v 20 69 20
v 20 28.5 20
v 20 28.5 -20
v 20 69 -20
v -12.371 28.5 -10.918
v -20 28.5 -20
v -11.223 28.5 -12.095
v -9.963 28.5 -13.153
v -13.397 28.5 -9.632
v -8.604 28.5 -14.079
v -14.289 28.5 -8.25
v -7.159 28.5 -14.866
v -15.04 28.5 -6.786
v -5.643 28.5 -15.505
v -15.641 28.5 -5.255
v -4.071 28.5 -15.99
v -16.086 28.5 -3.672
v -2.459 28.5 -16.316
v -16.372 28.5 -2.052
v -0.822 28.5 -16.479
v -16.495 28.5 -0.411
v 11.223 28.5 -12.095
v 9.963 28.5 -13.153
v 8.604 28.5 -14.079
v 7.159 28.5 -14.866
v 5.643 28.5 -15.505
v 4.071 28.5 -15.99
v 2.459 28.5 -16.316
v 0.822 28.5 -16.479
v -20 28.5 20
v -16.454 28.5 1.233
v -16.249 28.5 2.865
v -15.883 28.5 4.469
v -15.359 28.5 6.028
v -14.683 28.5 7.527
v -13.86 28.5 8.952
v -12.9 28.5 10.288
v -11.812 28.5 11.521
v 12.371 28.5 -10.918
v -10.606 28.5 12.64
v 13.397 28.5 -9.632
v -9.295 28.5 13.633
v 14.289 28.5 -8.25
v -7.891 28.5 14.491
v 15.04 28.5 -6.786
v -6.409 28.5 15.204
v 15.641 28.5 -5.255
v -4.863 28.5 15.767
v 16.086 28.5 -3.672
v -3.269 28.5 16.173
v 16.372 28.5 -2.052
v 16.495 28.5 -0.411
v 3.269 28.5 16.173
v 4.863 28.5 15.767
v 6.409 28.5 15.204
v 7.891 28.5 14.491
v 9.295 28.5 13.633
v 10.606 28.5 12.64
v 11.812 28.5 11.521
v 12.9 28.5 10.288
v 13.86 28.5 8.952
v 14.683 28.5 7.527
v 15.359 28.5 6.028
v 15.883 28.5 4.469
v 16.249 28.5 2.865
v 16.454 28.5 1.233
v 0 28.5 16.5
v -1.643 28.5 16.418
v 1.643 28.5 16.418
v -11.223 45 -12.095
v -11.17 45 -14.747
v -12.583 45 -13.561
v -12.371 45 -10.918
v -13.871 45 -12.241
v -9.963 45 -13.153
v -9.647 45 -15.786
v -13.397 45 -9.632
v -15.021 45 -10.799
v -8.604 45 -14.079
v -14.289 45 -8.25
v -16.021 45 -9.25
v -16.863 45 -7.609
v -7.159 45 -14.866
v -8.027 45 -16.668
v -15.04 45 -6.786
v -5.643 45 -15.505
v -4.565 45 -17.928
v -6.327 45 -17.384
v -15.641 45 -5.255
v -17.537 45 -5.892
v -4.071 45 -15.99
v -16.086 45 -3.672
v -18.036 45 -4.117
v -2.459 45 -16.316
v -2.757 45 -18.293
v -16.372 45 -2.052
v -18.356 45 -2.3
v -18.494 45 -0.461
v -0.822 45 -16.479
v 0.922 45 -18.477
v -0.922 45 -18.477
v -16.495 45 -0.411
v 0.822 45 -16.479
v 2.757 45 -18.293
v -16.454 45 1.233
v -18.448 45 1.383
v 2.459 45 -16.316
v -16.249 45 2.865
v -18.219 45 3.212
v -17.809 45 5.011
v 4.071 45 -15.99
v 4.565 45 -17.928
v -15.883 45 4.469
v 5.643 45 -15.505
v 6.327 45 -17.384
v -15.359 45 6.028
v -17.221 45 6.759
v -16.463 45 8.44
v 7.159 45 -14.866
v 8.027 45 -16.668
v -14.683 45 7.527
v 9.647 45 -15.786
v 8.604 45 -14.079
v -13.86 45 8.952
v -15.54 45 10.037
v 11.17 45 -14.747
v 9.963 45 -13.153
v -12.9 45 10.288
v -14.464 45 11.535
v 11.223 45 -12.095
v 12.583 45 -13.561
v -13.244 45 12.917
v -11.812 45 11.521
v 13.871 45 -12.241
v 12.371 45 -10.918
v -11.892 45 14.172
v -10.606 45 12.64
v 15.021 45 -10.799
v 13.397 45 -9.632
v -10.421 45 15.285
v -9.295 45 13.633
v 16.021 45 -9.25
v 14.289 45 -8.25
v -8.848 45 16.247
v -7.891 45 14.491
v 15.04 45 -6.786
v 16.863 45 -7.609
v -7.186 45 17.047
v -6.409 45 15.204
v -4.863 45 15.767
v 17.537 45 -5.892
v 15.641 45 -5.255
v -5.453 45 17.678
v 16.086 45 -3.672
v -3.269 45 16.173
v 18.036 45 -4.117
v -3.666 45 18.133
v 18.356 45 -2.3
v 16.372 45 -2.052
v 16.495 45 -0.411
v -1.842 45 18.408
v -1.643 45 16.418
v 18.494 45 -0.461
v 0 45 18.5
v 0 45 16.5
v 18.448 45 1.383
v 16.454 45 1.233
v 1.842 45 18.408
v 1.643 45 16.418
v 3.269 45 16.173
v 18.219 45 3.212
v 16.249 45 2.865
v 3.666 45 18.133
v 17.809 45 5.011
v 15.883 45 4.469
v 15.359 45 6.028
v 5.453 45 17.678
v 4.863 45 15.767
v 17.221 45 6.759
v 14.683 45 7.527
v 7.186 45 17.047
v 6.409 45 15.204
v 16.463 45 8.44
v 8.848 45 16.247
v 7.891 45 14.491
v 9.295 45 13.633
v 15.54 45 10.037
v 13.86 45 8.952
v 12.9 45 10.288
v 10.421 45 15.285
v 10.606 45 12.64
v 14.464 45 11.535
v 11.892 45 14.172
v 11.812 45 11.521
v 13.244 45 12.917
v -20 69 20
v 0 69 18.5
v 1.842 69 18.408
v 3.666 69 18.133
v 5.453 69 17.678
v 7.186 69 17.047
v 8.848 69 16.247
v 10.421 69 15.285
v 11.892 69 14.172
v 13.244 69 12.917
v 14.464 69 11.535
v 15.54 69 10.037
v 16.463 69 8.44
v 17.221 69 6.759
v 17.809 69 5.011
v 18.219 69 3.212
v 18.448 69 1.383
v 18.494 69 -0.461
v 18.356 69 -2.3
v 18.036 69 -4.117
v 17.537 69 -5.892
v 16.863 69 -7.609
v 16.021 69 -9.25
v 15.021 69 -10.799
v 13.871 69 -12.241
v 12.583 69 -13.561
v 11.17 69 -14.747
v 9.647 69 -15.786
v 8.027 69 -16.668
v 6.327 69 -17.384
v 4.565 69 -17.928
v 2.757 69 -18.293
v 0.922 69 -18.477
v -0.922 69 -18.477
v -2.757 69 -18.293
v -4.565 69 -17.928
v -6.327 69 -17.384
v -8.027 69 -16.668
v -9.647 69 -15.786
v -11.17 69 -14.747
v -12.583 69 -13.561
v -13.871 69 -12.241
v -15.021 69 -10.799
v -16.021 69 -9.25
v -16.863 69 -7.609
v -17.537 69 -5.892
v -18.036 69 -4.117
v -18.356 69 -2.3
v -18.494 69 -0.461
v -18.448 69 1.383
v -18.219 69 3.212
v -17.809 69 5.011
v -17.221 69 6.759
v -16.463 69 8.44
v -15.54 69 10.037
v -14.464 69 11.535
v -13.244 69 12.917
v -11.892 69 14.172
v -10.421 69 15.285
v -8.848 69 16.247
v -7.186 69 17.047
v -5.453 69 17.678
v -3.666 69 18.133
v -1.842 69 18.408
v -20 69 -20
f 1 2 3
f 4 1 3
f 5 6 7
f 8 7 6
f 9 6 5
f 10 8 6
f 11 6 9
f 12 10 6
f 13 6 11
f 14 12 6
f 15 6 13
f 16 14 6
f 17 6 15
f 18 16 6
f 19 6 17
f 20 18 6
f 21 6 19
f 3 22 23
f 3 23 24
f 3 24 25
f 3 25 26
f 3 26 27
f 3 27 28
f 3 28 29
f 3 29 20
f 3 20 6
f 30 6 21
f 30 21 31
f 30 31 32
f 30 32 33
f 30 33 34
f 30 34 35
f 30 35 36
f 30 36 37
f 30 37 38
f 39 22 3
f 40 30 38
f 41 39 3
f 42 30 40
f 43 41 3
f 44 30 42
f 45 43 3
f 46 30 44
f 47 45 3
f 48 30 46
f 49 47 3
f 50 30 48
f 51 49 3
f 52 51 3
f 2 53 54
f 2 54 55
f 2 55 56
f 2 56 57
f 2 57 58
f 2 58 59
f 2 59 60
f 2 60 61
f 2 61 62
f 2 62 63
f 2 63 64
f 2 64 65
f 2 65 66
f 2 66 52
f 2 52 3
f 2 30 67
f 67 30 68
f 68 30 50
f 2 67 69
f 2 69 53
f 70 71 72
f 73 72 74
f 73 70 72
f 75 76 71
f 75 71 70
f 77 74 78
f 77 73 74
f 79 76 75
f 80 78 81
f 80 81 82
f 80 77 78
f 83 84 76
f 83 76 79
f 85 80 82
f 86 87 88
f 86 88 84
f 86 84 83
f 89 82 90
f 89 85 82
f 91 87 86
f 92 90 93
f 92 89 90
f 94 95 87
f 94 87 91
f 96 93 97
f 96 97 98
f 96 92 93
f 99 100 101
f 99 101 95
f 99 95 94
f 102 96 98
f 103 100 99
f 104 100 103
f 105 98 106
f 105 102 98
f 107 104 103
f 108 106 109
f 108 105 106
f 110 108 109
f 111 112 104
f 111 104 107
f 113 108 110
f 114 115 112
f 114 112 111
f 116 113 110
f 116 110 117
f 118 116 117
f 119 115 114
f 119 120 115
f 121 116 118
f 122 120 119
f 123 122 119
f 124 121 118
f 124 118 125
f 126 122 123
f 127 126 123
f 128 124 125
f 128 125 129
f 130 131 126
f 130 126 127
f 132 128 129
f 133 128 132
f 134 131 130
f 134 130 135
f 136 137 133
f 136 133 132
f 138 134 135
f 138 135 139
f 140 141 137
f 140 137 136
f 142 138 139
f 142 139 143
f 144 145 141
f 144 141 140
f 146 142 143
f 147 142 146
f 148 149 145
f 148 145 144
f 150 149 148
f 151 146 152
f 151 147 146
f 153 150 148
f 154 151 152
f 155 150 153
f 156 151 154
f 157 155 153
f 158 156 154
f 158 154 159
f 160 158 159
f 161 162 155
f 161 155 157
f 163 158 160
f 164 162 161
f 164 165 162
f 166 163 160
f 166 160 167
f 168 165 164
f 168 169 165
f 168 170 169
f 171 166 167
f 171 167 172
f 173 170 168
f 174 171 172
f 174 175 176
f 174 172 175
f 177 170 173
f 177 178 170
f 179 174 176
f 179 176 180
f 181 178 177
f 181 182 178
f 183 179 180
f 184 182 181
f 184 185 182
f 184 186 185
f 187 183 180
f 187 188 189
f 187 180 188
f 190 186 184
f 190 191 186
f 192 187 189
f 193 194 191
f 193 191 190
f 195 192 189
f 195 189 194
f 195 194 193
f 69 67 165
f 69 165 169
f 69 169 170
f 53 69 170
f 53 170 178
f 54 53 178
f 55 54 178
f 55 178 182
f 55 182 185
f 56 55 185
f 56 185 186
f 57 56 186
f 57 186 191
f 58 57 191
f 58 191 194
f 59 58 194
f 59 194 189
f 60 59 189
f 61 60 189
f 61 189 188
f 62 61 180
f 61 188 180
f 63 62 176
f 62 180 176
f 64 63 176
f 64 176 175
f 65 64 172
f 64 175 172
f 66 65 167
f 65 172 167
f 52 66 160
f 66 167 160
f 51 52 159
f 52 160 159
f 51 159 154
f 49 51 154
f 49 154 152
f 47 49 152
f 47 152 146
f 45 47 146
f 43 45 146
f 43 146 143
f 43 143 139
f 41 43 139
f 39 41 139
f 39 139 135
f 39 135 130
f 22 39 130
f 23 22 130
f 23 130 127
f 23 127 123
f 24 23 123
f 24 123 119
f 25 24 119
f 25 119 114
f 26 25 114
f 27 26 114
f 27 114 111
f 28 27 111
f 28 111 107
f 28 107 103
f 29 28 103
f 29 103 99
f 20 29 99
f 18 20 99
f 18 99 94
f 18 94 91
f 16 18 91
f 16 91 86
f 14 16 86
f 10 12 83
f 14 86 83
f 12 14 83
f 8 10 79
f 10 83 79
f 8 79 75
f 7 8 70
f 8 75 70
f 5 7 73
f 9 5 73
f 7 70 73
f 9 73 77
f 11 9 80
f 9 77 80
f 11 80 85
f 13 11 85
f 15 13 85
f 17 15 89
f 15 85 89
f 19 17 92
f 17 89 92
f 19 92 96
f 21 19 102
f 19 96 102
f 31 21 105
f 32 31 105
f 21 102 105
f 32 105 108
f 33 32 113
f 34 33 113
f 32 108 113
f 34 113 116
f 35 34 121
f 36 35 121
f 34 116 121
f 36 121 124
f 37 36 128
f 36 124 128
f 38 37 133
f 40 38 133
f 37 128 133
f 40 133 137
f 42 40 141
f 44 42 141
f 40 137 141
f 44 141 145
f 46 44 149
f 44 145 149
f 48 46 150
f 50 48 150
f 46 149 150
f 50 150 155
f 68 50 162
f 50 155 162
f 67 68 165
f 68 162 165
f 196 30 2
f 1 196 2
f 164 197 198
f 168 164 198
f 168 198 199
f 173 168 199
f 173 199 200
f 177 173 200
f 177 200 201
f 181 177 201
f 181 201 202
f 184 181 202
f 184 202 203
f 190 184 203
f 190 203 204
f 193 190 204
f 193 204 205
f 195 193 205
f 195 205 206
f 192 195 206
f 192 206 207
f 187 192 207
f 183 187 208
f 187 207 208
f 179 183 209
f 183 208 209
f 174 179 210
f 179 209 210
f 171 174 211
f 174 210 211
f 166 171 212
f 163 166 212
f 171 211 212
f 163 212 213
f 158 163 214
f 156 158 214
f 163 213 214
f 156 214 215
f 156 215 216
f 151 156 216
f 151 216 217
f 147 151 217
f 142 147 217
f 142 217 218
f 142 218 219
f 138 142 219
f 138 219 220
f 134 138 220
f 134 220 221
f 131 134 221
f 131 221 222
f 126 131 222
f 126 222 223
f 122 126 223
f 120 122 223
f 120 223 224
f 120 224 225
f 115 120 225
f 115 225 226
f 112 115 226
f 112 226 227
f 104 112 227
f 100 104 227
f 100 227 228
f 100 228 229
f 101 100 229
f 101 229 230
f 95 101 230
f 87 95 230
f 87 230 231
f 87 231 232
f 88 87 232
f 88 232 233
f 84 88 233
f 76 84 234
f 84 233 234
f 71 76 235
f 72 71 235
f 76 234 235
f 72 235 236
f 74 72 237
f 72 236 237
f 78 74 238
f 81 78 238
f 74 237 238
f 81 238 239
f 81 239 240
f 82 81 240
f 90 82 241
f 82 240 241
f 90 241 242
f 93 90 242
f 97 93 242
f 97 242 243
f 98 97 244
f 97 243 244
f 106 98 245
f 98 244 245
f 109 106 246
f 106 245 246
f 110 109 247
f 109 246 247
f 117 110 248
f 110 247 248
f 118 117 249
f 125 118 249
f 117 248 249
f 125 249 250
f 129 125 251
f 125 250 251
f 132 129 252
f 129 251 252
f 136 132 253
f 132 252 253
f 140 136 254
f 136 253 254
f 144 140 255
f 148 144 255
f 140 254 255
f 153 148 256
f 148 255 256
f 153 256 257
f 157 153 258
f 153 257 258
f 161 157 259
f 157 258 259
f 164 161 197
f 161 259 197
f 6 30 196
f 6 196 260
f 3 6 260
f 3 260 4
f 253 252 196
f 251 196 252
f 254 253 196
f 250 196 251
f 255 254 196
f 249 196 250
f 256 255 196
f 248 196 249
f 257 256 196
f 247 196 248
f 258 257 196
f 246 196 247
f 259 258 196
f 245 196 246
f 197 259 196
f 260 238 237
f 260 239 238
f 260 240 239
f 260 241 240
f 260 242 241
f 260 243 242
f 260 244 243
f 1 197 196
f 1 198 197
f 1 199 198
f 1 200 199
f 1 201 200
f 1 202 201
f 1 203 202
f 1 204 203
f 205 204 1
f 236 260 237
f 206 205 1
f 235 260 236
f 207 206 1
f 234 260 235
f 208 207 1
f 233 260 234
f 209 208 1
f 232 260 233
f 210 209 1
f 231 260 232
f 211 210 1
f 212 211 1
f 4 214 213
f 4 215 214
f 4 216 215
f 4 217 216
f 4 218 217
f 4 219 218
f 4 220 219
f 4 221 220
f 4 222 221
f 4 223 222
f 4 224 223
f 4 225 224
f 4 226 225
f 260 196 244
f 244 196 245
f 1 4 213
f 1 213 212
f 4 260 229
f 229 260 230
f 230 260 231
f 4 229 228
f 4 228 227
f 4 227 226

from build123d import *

# Parameters (mm, degrees)
SKETCH1_W           = 40
SKETCH1_H           = 40
BOSS_EXTRUDE1_DEPTH = 90
SKETCH2_R           = 18.5
CUT_EXTRUDE1_DEPTH  = 45
SKETCH3_R           = 16.5
CUT_EXTRUDE2_DEPTH  = 41
SKETCH4_W           = 40
SKETCH4_H           = 40
CUT_EXTRUDE3_DEPTH  = 21
SKETCH6_W           = 20
SKETCH6_H           = 15
CUT_EXTRUDE4_DEPTH  = 83.225300243
SKETCH8_W           = 20
SKETCH8_H           = 15
CUT_EXTRUDE5_DEPTH  = 83.225300243
SKETCH11_W          = 40
SKETCH11_H          = 28.5
CUT_EXTRUDE8_DEPTH  = 83.225300243


with BuildPart() as part:
    # Sketch1 → Boss-Extrude1 (new body)
    with BuildSketch(Plane(origin=(0, 0, 0), x_dir=(1, 0, 0), z_dir=(0, 1, 0))):
        Rectangle(SKETCH1_W, SKETCH1_H)
    extrude(amount=BOSS_EXTRUDE1_DEPTH)

    # Sketch2 → Cut-Extrude1 (cut)
    with BuildSketch(Plane(origin=(0, 90, 0), x_dir=(1, 0, 0), z_dir=(0, 1, 0))):
        with Locations(Location((0, 0, 0), (0, 0, 270))):
            Circle(SKETCH2_R)
    extrude(amount=-CUT_EXTRUDE1_DEPTH, mode=Mode.SUBTRACT)

    # Sketch3 → Cut-Extrude2 (cut)
    with BuildSketch(Plane(origin=(0, 45, 0), x_dir=(1, 0, 0), z_dir=(0, 1, 0))):
        with Locations(Location((0, 0, 0), (0, 0, 270))):
            Circle(SKETCH3_R)
    extrude(amount=-CUT_EXTRUDE2_DEPTH, mode=Mode.SUBTRACT)

    # Sketch4 → Cut-Extrude3 (cut)
    with BuildSketch(Plane(origin=(0, 90, 0), x_dir=(1, 0, 0), z_dir=(0, 1, 0))):
        Rectangle(SKETCH4_W, SKETCH4_H)
    extrude(amount=-CUT_EXTRUDE3_DEPTH, mode=Mode.SUBTRACT)

    # Sketch6 → Cut-Extrude4 (cut, through all)
    with BuildSketch(Plane.XY.offset(20)):
        with Locations((0, 15)):
            Rectangle(SKETCH6_W, SKETCH6_H)
    extrude(amount=-CUT_EXTRUDE4_DEPTH, mode=Mode.SUBTRACT)

    # Sketch8 → Cut-Extrude5 (cut, through all)
    with BuildSketch(Plane.ZY.offset(20)):
        with Locations((0, 15)):
            Rectangle(SKETCH8_W, SKETCH8_H)
    extrude(amount=-CUT_EXTRUDE5_DEPTH, mode=Mode.SUBTRACT)

    # Sketch11 → Cut-Extrude8 (cut, through all)
    with BuildSketch(Plane.XY.offset(20)):
        with Locations((0, 14.25)):
            Rectangle(SKETCH11_W, SKETCH11_H)
    extrude(amount=-CUT_EXTRUDE8_DEPTH, mode=Mode.SUBTRACT)


solid = part.part
